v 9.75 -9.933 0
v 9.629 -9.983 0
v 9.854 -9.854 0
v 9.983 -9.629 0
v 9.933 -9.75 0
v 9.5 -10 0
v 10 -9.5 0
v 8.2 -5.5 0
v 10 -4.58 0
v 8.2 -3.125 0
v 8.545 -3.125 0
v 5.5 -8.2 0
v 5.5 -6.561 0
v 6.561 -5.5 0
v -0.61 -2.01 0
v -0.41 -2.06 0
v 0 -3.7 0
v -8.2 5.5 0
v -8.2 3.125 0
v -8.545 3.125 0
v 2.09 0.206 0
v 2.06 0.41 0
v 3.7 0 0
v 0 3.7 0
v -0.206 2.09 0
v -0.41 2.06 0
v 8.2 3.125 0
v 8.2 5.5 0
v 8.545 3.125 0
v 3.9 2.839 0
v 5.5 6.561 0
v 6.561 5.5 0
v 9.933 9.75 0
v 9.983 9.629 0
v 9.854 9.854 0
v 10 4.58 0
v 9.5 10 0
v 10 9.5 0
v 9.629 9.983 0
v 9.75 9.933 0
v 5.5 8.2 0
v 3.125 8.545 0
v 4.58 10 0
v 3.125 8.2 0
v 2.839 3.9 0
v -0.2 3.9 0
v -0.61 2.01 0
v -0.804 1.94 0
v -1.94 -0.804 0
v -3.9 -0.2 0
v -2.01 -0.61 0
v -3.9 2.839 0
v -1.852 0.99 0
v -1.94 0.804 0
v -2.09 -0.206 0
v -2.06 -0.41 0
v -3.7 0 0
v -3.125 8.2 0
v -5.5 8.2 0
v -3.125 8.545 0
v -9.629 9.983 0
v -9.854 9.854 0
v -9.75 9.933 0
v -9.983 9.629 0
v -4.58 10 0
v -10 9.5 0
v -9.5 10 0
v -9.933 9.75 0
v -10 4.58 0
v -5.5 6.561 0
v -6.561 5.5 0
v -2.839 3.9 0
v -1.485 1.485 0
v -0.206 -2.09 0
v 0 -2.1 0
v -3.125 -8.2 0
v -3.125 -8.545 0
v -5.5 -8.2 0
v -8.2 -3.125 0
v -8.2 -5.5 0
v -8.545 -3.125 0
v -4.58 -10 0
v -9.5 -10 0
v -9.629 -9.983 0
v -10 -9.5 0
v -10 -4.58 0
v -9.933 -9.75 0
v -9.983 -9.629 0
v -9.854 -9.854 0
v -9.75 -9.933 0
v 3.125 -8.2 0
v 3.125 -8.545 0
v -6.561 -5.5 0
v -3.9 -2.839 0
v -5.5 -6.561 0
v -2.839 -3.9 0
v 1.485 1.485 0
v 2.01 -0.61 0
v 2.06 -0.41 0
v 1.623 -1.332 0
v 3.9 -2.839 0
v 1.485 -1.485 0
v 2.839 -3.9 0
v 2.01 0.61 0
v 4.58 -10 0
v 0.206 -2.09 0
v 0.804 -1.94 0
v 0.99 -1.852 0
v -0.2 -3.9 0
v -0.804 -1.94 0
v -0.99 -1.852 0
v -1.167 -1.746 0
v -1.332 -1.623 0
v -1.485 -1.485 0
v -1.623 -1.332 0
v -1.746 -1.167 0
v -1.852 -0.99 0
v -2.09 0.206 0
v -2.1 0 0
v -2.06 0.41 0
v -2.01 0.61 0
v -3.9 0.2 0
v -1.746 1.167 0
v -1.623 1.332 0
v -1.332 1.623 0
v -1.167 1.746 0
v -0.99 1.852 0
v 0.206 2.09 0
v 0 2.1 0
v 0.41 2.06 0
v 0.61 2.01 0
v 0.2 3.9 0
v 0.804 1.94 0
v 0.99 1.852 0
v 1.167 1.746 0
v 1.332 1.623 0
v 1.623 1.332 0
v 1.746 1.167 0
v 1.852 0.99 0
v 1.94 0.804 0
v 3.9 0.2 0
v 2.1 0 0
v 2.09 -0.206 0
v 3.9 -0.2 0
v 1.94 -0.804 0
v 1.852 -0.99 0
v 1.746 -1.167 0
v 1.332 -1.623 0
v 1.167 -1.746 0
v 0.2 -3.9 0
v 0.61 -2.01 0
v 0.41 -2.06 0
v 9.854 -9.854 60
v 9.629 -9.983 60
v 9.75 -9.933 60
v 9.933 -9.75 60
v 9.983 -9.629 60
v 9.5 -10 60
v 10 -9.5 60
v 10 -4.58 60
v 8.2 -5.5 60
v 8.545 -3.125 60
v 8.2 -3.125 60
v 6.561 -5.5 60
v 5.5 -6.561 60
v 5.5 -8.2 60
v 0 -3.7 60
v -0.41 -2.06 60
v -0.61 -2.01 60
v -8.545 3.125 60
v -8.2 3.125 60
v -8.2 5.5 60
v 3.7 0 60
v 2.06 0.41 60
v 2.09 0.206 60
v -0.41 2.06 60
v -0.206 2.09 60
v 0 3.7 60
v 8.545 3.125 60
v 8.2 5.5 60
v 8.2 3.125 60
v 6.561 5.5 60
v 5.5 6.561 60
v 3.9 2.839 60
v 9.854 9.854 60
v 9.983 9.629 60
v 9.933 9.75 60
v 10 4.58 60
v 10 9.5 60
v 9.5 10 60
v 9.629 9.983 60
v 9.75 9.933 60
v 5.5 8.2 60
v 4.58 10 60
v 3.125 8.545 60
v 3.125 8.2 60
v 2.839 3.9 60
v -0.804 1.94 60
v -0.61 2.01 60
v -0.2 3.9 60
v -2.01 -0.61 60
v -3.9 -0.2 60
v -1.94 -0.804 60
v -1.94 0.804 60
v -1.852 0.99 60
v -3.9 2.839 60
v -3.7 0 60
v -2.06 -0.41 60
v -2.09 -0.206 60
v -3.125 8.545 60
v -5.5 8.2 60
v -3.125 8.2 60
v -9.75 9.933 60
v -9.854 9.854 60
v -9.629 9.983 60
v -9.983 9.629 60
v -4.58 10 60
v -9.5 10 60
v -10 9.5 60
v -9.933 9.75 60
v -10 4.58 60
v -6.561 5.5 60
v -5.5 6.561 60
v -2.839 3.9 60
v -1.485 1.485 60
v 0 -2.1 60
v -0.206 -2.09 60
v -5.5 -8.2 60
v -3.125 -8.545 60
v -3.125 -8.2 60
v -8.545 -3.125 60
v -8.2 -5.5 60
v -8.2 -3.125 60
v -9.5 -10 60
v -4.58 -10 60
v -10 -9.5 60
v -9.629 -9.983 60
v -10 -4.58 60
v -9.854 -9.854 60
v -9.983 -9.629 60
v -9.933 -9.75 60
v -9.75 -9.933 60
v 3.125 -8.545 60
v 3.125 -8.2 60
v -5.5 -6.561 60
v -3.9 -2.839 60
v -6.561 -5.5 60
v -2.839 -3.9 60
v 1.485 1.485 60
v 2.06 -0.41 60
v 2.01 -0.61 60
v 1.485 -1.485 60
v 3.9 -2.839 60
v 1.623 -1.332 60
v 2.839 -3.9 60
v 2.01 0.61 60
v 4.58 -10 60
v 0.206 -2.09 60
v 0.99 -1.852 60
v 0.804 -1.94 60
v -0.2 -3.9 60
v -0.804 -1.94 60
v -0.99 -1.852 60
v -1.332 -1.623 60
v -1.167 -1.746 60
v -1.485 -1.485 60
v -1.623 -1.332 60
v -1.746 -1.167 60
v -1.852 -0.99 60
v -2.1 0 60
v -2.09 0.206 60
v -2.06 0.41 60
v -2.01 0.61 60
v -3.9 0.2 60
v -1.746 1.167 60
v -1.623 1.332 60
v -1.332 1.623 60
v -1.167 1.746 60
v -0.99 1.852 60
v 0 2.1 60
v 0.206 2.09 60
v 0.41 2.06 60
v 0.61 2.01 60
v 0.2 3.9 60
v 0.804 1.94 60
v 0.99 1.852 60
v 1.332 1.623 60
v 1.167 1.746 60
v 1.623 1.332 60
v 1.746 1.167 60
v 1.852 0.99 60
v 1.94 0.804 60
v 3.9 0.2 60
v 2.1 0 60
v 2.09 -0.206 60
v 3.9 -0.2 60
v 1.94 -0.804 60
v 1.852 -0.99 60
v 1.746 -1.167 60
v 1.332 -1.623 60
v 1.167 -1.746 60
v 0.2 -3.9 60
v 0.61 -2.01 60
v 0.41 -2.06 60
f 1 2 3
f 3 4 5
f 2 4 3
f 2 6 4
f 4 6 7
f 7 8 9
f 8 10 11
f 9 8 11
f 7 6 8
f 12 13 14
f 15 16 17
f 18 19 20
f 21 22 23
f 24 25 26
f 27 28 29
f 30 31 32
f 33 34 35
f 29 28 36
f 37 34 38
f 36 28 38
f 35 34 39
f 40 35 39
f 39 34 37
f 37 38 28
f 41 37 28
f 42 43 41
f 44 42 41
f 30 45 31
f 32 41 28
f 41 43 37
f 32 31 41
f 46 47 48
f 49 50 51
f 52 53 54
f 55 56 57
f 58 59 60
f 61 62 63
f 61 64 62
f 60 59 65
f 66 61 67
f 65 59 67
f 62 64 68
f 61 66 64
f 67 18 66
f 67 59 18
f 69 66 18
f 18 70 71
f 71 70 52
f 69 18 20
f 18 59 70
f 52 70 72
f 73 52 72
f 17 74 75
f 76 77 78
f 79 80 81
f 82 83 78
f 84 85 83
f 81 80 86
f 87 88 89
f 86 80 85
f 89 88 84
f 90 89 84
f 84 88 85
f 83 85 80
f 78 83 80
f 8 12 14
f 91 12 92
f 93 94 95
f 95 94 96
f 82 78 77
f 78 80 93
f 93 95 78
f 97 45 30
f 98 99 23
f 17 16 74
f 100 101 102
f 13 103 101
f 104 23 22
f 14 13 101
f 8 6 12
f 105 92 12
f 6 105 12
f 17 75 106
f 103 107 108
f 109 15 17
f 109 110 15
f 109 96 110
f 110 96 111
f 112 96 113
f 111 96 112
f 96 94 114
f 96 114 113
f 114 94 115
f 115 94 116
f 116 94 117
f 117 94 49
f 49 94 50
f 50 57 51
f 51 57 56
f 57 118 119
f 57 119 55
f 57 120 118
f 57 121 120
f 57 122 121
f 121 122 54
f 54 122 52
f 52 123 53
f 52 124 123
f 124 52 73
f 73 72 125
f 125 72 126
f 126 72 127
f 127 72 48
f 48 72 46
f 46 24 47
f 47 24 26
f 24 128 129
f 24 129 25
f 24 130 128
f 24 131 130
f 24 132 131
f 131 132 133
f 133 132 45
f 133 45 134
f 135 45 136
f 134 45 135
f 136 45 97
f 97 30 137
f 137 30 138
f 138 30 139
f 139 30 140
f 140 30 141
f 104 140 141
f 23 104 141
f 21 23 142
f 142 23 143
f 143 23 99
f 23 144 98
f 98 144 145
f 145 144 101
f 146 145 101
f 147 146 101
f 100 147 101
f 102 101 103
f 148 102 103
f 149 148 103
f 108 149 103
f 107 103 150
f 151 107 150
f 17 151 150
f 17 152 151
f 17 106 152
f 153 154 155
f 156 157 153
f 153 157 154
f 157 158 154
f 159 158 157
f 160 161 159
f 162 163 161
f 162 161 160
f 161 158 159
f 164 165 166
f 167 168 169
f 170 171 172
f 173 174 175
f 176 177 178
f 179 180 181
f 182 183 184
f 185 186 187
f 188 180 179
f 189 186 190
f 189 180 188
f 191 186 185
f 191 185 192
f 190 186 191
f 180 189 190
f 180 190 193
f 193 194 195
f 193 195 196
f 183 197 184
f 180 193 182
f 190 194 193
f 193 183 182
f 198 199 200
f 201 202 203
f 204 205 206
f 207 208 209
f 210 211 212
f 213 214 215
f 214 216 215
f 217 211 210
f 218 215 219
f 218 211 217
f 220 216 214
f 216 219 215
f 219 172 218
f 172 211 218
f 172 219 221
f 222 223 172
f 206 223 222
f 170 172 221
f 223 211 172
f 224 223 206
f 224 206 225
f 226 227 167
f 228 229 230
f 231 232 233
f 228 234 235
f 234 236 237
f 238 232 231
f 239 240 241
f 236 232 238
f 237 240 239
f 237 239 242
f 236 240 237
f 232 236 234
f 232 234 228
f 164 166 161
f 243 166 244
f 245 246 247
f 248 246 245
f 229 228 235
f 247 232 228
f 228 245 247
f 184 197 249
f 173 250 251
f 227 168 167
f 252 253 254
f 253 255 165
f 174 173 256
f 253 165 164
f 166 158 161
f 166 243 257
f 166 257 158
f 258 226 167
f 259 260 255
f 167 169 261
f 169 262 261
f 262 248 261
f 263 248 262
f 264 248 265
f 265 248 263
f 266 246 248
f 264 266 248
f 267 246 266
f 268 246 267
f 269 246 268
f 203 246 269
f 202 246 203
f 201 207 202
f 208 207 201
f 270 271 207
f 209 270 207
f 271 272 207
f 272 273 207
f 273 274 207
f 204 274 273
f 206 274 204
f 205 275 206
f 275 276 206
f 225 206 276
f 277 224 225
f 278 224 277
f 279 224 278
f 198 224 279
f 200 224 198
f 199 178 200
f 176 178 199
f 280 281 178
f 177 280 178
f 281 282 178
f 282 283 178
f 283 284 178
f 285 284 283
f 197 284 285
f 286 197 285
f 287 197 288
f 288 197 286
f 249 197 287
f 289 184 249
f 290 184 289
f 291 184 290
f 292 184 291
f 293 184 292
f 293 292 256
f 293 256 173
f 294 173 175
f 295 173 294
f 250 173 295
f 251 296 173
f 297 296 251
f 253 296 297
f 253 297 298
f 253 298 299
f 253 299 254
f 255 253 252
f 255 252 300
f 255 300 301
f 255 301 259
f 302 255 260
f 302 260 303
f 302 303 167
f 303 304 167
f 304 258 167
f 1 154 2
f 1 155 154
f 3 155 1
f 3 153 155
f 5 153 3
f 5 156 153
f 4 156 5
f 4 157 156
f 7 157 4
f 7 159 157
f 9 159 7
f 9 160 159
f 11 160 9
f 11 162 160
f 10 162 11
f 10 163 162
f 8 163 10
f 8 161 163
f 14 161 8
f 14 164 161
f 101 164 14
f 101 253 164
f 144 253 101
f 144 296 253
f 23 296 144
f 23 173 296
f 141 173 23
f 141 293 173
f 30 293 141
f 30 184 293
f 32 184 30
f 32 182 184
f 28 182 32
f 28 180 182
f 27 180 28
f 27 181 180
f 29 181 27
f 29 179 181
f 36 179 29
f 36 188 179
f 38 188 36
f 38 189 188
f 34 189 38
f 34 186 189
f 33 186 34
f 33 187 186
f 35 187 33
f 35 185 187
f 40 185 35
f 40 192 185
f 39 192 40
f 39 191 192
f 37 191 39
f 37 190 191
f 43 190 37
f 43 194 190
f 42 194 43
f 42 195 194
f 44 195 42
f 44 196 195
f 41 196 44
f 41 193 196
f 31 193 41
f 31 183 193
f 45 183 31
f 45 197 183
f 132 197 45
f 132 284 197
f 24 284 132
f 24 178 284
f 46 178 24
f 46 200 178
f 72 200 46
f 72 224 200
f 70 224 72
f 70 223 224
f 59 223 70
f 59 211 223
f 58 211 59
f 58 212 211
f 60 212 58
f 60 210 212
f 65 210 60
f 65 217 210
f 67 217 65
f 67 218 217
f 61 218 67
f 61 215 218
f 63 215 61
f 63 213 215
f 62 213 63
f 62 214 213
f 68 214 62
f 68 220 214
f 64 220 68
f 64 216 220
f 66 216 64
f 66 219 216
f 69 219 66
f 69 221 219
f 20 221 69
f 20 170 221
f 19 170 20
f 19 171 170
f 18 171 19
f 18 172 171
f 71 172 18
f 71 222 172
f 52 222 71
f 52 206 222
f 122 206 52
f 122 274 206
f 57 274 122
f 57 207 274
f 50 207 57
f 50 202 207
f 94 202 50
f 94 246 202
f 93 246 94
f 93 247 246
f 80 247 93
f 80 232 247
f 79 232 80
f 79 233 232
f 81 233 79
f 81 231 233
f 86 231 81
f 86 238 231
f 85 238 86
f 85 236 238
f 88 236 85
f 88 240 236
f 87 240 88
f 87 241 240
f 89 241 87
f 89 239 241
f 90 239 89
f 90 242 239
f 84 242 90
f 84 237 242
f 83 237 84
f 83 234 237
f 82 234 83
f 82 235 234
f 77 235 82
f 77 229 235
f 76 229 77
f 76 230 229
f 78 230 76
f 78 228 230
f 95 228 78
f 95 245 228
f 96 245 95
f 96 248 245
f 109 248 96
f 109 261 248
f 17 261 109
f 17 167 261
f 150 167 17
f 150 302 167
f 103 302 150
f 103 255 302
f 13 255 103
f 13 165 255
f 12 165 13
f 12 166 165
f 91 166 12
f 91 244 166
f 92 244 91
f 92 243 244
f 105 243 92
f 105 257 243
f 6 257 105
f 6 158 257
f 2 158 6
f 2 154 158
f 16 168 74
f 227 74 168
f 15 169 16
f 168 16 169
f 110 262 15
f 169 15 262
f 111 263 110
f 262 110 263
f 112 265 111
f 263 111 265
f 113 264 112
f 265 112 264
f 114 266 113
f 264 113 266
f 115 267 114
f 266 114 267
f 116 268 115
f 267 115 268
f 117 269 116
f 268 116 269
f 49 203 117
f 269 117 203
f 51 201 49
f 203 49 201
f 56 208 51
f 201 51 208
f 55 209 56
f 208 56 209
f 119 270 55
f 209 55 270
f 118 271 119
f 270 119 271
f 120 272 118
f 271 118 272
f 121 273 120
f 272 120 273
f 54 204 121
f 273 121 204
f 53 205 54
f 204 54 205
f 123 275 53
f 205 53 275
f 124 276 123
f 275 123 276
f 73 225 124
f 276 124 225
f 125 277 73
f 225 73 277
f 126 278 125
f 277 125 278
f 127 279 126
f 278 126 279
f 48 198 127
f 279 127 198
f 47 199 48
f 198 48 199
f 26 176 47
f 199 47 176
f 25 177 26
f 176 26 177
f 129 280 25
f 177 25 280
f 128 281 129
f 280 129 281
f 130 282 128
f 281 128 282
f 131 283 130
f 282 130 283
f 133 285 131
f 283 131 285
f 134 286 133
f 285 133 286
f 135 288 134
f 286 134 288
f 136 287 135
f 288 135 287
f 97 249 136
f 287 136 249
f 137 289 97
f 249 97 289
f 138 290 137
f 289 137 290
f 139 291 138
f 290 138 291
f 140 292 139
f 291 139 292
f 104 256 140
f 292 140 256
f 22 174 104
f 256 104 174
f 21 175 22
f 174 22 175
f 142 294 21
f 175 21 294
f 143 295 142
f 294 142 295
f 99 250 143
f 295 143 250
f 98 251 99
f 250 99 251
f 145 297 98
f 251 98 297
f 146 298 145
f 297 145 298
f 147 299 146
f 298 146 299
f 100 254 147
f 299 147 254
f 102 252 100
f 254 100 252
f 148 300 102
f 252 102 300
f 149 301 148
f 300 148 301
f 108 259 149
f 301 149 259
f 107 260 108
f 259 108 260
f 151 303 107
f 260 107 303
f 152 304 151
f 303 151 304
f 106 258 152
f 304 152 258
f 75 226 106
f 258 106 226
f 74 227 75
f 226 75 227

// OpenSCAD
// OpenBuilds V-Slot 20x20, millimetres.
// Source: ../../datasheets/openbuilds-vslot-20x20.pdf, page 1.
// Open directly for a short inspection sample; `use` for library modules.
sample_length = 60;
section_only = false;

module vslot_2020_profile(corner_radius=0.5, centre_notch=0.2) {
    // Dimensioned features from drawing.
    half_size = 10;
    mouth_half = 9.16/2;
    throat_half = 6.25/2;
    channel_half = 11/2;
    shoulder_y = half_size - 1.80;
    floor_y = shoulder_y - 4.30;
    // 90-degree V: each face has a 45-degree slope.
    throat_y = half_size - (mouth_half-throat_half);
    // Adjacent diagonal cavity walls straddle y=x. Their normal
    // separation is the specified 1.50 mm web thickness.
    diagonal_offset = 1.50/sqrt(2);
    channel_knee_y = channel_half + diagonal_offset;
    floor_half = floor_y - diagonal_offset;

    // Corner radius and tiny floor-centre notch are visually estimated:
    // the PDF depicts them but does not dimension them.
    difference() {
        offset(r=corner_radius,$fn=24)
            square([20-2*corner_radius,20-2*corner_radius],center=true);
        circle(d=4.20,$fn=64);
        for(a=[0:90:270]) rotate(a)
            polygon([
                [-mouth_half,11], [mouth_half,11],
                [mouth_half,half_size], [throat_half,throat_y],
                [throat_half,shoulder_y], [channel_half,shoulder_y],
                [channel_half,channel_knee_y], [floor_half,floor_y],
                [centre_notch,floor_y], [0,floor_y-centre_notch],
                [-centre_notch,floor_y], [-floor_half,floor_y],
                [-channel_half,channel_knee_y], [-channel_half,shoulder_y],
                [-throat_half,shoulder_y], [-throat_half,throat_y],
                [-mouth_half,half_size]
            ]);
    }
}

module vslot_2020(length=500) {
    assert(length>0,"Rail length must be positive");
    linear_extrude(height=length,convexity=10) vslot_2020_profile();
}

if(section_only) vslot_2020_profile();
else color([0.66,0.71,0.75]) vslot_2020(sample_length);
